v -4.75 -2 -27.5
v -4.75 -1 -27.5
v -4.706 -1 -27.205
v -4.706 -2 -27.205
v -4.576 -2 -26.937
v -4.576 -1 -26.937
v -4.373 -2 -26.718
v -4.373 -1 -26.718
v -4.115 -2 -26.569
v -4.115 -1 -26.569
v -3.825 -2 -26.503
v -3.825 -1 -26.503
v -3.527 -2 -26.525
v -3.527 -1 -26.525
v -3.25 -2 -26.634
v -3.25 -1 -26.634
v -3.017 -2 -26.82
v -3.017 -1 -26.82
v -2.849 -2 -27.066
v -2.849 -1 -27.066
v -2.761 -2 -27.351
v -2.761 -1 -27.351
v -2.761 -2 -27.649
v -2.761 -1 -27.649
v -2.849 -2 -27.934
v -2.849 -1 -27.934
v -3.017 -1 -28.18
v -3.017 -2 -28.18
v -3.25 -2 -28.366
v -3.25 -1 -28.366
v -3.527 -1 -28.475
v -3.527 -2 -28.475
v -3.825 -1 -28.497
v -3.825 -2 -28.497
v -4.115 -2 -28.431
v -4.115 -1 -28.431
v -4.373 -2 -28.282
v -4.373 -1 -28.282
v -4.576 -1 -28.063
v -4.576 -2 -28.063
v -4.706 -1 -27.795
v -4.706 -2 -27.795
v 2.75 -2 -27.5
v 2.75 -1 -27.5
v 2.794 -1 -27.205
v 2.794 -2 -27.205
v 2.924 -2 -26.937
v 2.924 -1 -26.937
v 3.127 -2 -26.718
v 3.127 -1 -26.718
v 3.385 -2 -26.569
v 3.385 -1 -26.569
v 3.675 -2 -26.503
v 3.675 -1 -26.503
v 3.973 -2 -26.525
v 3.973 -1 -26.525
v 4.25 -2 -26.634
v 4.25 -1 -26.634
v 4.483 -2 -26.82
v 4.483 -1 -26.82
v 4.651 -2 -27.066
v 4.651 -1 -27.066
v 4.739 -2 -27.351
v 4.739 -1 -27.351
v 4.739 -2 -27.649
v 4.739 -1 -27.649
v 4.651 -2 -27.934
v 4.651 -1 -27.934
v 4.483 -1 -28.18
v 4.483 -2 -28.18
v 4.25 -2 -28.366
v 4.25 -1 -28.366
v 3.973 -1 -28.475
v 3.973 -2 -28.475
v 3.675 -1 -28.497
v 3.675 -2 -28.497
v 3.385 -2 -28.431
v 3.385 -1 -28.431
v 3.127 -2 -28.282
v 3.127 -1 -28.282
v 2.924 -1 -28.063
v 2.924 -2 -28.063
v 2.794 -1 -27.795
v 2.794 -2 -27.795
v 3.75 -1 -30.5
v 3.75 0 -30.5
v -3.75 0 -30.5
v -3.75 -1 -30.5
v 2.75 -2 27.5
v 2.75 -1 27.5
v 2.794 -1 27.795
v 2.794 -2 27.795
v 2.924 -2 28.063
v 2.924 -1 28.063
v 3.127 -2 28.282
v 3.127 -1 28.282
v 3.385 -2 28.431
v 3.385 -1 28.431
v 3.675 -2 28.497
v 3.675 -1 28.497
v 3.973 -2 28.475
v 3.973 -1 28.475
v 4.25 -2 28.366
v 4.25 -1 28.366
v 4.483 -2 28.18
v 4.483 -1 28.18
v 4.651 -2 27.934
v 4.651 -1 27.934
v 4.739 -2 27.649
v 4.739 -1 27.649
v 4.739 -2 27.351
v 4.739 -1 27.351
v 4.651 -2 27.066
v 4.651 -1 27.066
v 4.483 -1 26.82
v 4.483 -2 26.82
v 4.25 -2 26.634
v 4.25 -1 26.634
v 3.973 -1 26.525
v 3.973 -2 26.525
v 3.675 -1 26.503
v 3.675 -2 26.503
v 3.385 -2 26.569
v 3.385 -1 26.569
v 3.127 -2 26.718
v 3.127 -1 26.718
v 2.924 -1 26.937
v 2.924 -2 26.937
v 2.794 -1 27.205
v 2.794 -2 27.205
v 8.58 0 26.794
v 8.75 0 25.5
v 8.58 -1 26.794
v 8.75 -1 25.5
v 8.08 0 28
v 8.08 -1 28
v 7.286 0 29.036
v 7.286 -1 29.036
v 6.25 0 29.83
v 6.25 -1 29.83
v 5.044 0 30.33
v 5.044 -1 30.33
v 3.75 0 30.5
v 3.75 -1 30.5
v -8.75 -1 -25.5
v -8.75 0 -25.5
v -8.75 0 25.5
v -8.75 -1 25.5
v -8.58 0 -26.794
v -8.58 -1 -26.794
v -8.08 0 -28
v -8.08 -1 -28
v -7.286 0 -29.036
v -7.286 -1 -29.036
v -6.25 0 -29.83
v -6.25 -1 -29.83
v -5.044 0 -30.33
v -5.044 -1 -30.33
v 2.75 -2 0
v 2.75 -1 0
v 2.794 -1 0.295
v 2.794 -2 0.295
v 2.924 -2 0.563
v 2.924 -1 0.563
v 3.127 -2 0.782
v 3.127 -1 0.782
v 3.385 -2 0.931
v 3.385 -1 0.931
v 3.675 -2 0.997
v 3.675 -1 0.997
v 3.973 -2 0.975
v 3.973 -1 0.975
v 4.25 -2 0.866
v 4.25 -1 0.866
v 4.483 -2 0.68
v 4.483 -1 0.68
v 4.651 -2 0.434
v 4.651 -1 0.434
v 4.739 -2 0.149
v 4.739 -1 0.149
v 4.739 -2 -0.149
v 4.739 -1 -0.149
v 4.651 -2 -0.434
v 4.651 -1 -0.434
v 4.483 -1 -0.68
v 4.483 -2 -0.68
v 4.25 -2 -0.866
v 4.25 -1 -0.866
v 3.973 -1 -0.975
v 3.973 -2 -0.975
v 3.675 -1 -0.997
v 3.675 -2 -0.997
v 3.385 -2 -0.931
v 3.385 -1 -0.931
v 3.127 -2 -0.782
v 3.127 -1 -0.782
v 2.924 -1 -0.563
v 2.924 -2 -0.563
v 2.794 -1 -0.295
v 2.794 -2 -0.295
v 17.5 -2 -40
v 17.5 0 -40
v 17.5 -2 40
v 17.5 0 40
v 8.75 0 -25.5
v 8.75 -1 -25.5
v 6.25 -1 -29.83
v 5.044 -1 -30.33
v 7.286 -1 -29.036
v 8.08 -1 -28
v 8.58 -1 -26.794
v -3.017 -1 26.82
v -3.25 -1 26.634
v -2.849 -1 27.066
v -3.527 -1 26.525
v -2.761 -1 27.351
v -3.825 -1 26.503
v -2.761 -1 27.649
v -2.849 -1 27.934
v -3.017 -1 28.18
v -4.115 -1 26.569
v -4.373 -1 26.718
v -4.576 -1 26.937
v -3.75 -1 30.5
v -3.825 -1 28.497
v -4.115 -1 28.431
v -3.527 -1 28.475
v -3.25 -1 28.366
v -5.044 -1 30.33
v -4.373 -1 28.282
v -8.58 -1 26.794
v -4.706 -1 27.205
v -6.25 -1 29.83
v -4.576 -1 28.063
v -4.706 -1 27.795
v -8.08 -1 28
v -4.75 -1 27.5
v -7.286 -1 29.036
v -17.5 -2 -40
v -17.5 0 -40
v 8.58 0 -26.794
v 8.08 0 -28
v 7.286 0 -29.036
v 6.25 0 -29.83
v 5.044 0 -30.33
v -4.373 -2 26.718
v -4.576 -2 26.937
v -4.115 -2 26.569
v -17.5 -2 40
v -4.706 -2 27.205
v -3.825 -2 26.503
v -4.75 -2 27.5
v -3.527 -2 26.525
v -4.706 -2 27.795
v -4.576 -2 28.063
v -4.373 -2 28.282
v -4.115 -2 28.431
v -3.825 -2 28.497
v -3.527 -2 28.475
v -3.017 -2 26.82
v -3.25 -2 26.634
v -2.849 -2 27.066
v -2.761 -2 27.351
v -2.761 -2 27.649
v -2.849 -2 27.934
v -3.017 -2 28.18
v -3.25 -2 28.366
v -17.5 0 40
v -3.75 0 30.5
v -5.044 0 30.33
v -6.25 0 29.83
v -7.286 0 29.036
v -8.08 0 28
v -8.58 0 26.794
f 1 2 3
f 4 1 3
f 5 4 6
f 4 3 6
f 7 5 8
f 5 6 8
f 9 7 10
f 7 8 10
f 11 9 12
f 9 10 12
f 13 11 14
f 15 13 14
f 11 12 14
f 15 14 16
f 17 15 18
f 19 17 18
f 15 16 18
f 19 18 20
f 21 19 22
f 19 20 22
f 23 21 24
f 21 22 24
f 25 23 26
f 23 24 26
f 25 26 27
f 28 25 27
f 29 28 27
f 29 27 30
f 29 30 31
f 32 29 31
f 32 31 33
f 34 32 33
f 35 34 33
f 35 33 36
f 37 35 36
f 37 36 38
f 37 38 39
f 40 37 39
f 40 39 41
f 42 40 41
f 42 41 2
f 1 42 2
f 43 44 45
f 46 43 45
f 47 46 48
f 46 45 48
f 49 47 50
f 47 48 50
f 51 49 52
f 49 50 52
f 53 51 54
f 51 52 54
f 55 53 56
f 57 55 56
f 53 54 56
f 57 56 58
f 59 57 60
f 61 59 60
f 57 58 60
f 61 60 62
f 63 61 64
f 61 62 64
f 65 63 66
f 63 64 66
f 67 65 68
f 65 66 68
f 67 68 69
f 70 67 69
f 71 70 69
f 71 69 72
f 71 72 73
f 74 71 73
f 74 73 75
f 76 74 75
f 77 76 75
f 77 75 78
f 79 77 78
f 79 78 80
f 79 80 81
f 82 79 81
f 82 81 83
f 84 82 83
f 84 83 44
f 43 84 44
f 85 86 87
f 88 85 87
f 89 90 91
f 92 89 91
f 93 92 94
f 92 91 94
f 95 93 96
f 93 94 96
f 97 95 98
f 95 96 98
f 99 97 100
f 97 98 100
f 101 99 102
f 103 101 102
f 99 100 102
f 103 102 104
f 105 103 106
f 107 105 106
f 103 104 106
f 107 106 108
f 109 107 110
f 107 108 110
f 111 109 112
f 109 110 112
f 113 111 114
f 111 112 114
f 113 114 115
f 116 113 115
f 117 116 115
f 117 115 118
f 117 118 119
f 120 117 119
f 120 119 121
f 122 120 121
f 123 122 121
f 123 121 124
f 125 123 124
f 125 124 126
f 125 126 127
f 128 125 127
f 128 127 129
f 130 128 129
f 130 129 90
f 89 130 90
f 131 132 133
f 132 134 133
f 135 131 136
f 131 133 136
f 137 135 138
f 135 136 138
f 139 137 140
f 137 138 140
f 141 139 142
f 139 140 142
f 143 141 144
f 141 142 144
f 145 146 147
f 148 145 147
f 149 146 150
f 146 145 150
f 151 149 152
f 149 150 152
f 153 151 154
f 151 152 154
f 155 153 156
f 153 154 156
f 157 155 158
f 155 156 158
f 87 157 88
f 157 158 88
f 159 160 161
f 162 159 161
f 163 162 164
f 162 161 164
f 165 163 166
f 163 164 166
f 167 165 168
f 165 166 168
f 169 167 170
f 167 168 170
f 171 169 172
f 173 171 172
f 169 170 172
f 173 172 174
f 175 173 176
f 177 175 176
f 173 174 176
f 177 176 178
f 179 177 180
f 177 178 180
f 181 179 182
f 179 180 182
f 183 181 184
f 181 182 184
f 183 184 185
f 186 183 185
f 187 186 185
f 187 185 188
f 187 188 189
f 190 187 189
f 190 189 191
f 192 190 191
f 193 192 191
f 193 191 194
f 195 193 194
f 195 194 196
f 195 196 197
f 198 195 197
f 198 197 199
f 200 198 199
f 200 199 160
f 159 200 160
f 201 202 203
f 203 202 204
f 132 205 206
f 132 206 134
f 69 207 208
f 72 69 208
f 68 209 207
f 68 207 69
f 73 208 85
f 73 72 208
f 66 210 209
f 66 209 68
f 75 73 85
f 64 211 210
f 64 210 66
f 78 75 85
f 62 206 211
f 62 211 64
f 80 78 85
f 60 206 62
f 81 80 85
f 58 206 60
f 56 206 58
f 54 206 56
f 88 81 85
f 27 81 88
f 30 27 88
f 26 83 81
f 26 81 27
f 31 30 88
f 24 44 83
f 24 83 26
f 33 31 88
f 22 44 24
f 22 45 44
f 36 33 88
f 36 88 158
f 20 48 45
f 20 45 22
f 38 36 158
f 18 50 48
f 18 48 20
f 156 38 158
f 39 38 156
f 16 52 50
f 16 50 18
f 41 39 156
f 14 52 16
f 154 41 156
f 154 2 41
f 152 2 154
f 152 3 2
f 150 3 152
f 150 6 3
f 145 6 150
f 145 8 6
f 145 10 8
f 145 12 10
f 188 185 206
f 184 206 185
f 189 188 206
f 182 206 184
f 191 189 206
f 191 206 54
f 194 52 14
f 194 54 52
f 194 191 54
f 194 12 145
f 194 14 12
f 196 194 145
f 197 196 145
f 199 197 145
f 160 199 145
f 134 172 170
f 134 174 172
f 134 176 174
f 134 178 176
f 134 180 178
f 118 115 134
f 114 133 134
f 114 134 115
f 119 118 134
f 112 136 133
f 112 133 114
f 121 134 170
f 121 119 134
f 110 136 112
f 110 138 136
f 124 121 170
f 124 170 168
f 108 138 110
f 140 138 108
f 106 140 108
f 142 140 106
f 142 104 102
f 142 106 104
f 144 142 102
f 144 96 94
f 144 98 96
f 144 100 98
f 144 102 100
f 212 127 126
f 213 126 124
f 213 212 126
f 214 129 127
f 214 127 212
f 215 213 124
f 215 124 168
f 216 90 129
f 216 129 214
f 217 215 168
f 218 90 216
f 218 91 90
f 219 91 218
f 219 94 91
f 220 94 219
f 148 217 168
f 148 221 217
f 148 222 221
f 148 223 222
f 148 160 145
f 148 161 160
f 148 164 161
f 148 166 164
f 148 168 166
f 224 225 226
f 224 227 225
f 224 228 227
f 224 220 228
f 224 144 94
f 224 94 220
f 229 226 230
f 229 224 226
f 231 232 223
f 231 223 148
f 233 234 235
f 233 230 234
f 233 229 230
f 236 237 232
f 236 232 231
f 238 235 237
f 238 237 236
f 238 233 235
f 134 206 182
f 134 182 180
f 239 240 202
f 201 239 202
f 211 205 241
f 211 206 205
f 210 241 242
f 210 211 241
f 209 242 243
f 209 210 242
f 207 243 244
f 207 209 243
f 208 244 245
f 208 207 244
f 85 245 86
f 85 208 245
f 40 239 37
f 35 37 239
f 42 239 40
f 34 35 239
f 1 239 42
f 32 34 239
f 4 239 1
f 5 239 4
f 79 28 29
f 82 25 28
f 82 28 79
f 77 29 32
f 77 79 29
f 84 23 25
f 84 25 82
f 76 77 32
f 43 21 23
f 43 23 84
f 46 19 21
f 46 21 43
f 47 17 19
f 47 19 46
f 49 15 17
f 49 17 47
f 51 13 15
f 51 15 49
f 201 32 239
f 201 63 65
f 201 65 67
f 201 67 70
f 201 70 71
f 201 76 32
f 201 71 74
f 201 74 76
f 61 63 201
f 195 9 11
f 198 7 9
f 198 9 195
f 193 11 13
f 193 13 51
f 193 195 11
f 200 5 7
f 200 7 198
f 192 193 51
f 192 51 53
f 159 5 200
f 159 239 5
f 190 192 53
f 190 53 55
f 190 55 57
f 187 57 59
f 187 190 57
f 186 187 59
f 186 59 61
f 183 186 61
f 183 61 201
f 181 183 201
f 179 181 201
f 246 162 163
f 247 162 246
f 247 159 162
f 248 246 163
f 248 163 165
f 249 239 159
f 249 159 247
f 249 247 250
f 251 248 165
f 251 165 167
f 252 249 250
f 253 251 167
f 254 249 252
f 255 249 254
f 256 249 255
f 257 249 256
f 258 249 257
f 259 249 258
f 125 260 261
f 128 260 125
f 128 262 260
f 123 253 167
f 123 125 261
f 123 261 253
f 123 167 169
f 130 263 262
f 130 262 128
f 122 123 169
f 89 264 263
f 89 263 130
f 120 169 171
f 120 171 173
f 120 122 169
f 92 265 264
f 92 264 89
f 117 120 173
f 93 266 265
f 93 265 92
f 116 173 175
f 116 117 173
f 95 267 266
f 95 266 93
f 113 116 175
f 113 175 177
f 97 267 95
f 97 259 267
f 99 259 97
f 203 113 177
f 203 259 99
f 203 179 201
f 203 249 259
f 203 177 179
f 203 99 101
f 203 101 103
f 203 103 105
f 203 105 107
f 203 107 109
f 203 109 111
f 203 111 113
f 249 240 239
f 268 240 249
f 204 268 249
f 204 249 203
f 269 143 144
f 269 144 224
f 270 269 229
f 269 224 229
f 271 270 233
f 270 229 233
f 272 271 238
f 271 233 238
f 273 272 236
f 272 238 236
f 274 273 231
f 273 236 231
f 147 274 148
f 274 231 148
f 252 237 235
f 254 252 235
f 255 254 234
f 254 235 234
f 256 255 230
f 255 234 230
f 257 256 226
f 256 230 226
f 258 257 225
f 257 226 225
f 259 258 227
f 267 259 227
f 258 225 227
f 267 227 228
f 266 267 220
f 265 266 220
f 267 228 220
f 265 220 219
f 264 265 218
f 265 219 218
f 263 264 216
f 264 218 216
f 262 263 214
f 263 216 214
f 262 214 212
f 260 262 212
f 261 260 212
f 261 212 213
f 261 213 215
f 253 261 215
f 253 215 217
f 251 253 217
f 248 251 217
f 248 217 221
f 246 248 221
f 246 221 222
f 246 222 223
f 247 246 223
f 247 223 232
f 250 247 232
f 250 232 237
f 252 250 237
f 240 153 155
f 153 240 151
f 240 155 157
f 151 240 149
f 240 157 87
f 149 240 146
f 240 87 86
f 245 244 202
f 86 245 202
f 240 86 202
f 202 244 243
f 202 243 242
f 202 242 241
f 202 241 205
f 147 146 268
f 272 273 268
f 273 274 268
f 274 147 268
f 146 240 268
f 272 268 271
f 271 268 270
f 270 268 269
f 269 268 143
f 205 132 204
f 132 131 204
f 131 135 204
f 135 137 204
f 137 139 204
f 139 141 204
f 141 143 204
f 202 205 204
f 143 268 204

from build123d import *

# Parameters (mm, degrees)
F0_W     = 35
F0_H     = 80
F1_DEPTH = 2
F2_W     = 17.5
F2_H     = 61
F3_DEPTH = 1
F4_R     = 1
F5_DEPTH = 25
F6_R     = 5


with BuildPart() as f1:
    # F0 (on Front) → F1 (new body)
    with BuildSketch(Plane.XZ):
        Rectangle(F0_W, F0_H)
    extrude(amount=F1_DEPTH)

    # F2 (on face) → F3 (cut)
    with BuildSketch(Plane(origin=(0, 0, 0), x_dir=(-1, 0, 0), z_dir=(0, 1, 0))):
        Rectangle(F2_W, F2_H)
    extrude(amount=-F3_DEPTH, mode=Mode.SUBTRACT)

    # F4 (on face) → F5 (cut)
    with BuildSketch(Plane(origin=(0, -1, 0), x_dir=(-1, 0, 0), z_dir=(0, 1, 0))):
        with Locations((-3.75, 27.5)):
            Circle(F4_R)
        with Locations((-3.75, 0)):
            Circle(F4_R)
        with Locations((-3.75, -27.5)):
            Circle(F4_R)
        with Locations((3.75, 27.5)):
            Circle(F4_R)
        with Locations((3.75, -27.5)):
            Circle(F4_R)
    extrude(amount=-F5_DEPTH, mode=Mode.SUBTRACT)

    # F6
    f6_edges = [f1.edges().sort_by_distance(p)[0] for p in [
        (-8.75, -0.5, 30.5),
        (8.75, -0.5, 30.5),
        (-8.75, -0.5, -30.5),
        (8.75, -0.5, -30.5),
    ]]
    fillet(f6_edges, radius=F6_R)


solid = f1.part
